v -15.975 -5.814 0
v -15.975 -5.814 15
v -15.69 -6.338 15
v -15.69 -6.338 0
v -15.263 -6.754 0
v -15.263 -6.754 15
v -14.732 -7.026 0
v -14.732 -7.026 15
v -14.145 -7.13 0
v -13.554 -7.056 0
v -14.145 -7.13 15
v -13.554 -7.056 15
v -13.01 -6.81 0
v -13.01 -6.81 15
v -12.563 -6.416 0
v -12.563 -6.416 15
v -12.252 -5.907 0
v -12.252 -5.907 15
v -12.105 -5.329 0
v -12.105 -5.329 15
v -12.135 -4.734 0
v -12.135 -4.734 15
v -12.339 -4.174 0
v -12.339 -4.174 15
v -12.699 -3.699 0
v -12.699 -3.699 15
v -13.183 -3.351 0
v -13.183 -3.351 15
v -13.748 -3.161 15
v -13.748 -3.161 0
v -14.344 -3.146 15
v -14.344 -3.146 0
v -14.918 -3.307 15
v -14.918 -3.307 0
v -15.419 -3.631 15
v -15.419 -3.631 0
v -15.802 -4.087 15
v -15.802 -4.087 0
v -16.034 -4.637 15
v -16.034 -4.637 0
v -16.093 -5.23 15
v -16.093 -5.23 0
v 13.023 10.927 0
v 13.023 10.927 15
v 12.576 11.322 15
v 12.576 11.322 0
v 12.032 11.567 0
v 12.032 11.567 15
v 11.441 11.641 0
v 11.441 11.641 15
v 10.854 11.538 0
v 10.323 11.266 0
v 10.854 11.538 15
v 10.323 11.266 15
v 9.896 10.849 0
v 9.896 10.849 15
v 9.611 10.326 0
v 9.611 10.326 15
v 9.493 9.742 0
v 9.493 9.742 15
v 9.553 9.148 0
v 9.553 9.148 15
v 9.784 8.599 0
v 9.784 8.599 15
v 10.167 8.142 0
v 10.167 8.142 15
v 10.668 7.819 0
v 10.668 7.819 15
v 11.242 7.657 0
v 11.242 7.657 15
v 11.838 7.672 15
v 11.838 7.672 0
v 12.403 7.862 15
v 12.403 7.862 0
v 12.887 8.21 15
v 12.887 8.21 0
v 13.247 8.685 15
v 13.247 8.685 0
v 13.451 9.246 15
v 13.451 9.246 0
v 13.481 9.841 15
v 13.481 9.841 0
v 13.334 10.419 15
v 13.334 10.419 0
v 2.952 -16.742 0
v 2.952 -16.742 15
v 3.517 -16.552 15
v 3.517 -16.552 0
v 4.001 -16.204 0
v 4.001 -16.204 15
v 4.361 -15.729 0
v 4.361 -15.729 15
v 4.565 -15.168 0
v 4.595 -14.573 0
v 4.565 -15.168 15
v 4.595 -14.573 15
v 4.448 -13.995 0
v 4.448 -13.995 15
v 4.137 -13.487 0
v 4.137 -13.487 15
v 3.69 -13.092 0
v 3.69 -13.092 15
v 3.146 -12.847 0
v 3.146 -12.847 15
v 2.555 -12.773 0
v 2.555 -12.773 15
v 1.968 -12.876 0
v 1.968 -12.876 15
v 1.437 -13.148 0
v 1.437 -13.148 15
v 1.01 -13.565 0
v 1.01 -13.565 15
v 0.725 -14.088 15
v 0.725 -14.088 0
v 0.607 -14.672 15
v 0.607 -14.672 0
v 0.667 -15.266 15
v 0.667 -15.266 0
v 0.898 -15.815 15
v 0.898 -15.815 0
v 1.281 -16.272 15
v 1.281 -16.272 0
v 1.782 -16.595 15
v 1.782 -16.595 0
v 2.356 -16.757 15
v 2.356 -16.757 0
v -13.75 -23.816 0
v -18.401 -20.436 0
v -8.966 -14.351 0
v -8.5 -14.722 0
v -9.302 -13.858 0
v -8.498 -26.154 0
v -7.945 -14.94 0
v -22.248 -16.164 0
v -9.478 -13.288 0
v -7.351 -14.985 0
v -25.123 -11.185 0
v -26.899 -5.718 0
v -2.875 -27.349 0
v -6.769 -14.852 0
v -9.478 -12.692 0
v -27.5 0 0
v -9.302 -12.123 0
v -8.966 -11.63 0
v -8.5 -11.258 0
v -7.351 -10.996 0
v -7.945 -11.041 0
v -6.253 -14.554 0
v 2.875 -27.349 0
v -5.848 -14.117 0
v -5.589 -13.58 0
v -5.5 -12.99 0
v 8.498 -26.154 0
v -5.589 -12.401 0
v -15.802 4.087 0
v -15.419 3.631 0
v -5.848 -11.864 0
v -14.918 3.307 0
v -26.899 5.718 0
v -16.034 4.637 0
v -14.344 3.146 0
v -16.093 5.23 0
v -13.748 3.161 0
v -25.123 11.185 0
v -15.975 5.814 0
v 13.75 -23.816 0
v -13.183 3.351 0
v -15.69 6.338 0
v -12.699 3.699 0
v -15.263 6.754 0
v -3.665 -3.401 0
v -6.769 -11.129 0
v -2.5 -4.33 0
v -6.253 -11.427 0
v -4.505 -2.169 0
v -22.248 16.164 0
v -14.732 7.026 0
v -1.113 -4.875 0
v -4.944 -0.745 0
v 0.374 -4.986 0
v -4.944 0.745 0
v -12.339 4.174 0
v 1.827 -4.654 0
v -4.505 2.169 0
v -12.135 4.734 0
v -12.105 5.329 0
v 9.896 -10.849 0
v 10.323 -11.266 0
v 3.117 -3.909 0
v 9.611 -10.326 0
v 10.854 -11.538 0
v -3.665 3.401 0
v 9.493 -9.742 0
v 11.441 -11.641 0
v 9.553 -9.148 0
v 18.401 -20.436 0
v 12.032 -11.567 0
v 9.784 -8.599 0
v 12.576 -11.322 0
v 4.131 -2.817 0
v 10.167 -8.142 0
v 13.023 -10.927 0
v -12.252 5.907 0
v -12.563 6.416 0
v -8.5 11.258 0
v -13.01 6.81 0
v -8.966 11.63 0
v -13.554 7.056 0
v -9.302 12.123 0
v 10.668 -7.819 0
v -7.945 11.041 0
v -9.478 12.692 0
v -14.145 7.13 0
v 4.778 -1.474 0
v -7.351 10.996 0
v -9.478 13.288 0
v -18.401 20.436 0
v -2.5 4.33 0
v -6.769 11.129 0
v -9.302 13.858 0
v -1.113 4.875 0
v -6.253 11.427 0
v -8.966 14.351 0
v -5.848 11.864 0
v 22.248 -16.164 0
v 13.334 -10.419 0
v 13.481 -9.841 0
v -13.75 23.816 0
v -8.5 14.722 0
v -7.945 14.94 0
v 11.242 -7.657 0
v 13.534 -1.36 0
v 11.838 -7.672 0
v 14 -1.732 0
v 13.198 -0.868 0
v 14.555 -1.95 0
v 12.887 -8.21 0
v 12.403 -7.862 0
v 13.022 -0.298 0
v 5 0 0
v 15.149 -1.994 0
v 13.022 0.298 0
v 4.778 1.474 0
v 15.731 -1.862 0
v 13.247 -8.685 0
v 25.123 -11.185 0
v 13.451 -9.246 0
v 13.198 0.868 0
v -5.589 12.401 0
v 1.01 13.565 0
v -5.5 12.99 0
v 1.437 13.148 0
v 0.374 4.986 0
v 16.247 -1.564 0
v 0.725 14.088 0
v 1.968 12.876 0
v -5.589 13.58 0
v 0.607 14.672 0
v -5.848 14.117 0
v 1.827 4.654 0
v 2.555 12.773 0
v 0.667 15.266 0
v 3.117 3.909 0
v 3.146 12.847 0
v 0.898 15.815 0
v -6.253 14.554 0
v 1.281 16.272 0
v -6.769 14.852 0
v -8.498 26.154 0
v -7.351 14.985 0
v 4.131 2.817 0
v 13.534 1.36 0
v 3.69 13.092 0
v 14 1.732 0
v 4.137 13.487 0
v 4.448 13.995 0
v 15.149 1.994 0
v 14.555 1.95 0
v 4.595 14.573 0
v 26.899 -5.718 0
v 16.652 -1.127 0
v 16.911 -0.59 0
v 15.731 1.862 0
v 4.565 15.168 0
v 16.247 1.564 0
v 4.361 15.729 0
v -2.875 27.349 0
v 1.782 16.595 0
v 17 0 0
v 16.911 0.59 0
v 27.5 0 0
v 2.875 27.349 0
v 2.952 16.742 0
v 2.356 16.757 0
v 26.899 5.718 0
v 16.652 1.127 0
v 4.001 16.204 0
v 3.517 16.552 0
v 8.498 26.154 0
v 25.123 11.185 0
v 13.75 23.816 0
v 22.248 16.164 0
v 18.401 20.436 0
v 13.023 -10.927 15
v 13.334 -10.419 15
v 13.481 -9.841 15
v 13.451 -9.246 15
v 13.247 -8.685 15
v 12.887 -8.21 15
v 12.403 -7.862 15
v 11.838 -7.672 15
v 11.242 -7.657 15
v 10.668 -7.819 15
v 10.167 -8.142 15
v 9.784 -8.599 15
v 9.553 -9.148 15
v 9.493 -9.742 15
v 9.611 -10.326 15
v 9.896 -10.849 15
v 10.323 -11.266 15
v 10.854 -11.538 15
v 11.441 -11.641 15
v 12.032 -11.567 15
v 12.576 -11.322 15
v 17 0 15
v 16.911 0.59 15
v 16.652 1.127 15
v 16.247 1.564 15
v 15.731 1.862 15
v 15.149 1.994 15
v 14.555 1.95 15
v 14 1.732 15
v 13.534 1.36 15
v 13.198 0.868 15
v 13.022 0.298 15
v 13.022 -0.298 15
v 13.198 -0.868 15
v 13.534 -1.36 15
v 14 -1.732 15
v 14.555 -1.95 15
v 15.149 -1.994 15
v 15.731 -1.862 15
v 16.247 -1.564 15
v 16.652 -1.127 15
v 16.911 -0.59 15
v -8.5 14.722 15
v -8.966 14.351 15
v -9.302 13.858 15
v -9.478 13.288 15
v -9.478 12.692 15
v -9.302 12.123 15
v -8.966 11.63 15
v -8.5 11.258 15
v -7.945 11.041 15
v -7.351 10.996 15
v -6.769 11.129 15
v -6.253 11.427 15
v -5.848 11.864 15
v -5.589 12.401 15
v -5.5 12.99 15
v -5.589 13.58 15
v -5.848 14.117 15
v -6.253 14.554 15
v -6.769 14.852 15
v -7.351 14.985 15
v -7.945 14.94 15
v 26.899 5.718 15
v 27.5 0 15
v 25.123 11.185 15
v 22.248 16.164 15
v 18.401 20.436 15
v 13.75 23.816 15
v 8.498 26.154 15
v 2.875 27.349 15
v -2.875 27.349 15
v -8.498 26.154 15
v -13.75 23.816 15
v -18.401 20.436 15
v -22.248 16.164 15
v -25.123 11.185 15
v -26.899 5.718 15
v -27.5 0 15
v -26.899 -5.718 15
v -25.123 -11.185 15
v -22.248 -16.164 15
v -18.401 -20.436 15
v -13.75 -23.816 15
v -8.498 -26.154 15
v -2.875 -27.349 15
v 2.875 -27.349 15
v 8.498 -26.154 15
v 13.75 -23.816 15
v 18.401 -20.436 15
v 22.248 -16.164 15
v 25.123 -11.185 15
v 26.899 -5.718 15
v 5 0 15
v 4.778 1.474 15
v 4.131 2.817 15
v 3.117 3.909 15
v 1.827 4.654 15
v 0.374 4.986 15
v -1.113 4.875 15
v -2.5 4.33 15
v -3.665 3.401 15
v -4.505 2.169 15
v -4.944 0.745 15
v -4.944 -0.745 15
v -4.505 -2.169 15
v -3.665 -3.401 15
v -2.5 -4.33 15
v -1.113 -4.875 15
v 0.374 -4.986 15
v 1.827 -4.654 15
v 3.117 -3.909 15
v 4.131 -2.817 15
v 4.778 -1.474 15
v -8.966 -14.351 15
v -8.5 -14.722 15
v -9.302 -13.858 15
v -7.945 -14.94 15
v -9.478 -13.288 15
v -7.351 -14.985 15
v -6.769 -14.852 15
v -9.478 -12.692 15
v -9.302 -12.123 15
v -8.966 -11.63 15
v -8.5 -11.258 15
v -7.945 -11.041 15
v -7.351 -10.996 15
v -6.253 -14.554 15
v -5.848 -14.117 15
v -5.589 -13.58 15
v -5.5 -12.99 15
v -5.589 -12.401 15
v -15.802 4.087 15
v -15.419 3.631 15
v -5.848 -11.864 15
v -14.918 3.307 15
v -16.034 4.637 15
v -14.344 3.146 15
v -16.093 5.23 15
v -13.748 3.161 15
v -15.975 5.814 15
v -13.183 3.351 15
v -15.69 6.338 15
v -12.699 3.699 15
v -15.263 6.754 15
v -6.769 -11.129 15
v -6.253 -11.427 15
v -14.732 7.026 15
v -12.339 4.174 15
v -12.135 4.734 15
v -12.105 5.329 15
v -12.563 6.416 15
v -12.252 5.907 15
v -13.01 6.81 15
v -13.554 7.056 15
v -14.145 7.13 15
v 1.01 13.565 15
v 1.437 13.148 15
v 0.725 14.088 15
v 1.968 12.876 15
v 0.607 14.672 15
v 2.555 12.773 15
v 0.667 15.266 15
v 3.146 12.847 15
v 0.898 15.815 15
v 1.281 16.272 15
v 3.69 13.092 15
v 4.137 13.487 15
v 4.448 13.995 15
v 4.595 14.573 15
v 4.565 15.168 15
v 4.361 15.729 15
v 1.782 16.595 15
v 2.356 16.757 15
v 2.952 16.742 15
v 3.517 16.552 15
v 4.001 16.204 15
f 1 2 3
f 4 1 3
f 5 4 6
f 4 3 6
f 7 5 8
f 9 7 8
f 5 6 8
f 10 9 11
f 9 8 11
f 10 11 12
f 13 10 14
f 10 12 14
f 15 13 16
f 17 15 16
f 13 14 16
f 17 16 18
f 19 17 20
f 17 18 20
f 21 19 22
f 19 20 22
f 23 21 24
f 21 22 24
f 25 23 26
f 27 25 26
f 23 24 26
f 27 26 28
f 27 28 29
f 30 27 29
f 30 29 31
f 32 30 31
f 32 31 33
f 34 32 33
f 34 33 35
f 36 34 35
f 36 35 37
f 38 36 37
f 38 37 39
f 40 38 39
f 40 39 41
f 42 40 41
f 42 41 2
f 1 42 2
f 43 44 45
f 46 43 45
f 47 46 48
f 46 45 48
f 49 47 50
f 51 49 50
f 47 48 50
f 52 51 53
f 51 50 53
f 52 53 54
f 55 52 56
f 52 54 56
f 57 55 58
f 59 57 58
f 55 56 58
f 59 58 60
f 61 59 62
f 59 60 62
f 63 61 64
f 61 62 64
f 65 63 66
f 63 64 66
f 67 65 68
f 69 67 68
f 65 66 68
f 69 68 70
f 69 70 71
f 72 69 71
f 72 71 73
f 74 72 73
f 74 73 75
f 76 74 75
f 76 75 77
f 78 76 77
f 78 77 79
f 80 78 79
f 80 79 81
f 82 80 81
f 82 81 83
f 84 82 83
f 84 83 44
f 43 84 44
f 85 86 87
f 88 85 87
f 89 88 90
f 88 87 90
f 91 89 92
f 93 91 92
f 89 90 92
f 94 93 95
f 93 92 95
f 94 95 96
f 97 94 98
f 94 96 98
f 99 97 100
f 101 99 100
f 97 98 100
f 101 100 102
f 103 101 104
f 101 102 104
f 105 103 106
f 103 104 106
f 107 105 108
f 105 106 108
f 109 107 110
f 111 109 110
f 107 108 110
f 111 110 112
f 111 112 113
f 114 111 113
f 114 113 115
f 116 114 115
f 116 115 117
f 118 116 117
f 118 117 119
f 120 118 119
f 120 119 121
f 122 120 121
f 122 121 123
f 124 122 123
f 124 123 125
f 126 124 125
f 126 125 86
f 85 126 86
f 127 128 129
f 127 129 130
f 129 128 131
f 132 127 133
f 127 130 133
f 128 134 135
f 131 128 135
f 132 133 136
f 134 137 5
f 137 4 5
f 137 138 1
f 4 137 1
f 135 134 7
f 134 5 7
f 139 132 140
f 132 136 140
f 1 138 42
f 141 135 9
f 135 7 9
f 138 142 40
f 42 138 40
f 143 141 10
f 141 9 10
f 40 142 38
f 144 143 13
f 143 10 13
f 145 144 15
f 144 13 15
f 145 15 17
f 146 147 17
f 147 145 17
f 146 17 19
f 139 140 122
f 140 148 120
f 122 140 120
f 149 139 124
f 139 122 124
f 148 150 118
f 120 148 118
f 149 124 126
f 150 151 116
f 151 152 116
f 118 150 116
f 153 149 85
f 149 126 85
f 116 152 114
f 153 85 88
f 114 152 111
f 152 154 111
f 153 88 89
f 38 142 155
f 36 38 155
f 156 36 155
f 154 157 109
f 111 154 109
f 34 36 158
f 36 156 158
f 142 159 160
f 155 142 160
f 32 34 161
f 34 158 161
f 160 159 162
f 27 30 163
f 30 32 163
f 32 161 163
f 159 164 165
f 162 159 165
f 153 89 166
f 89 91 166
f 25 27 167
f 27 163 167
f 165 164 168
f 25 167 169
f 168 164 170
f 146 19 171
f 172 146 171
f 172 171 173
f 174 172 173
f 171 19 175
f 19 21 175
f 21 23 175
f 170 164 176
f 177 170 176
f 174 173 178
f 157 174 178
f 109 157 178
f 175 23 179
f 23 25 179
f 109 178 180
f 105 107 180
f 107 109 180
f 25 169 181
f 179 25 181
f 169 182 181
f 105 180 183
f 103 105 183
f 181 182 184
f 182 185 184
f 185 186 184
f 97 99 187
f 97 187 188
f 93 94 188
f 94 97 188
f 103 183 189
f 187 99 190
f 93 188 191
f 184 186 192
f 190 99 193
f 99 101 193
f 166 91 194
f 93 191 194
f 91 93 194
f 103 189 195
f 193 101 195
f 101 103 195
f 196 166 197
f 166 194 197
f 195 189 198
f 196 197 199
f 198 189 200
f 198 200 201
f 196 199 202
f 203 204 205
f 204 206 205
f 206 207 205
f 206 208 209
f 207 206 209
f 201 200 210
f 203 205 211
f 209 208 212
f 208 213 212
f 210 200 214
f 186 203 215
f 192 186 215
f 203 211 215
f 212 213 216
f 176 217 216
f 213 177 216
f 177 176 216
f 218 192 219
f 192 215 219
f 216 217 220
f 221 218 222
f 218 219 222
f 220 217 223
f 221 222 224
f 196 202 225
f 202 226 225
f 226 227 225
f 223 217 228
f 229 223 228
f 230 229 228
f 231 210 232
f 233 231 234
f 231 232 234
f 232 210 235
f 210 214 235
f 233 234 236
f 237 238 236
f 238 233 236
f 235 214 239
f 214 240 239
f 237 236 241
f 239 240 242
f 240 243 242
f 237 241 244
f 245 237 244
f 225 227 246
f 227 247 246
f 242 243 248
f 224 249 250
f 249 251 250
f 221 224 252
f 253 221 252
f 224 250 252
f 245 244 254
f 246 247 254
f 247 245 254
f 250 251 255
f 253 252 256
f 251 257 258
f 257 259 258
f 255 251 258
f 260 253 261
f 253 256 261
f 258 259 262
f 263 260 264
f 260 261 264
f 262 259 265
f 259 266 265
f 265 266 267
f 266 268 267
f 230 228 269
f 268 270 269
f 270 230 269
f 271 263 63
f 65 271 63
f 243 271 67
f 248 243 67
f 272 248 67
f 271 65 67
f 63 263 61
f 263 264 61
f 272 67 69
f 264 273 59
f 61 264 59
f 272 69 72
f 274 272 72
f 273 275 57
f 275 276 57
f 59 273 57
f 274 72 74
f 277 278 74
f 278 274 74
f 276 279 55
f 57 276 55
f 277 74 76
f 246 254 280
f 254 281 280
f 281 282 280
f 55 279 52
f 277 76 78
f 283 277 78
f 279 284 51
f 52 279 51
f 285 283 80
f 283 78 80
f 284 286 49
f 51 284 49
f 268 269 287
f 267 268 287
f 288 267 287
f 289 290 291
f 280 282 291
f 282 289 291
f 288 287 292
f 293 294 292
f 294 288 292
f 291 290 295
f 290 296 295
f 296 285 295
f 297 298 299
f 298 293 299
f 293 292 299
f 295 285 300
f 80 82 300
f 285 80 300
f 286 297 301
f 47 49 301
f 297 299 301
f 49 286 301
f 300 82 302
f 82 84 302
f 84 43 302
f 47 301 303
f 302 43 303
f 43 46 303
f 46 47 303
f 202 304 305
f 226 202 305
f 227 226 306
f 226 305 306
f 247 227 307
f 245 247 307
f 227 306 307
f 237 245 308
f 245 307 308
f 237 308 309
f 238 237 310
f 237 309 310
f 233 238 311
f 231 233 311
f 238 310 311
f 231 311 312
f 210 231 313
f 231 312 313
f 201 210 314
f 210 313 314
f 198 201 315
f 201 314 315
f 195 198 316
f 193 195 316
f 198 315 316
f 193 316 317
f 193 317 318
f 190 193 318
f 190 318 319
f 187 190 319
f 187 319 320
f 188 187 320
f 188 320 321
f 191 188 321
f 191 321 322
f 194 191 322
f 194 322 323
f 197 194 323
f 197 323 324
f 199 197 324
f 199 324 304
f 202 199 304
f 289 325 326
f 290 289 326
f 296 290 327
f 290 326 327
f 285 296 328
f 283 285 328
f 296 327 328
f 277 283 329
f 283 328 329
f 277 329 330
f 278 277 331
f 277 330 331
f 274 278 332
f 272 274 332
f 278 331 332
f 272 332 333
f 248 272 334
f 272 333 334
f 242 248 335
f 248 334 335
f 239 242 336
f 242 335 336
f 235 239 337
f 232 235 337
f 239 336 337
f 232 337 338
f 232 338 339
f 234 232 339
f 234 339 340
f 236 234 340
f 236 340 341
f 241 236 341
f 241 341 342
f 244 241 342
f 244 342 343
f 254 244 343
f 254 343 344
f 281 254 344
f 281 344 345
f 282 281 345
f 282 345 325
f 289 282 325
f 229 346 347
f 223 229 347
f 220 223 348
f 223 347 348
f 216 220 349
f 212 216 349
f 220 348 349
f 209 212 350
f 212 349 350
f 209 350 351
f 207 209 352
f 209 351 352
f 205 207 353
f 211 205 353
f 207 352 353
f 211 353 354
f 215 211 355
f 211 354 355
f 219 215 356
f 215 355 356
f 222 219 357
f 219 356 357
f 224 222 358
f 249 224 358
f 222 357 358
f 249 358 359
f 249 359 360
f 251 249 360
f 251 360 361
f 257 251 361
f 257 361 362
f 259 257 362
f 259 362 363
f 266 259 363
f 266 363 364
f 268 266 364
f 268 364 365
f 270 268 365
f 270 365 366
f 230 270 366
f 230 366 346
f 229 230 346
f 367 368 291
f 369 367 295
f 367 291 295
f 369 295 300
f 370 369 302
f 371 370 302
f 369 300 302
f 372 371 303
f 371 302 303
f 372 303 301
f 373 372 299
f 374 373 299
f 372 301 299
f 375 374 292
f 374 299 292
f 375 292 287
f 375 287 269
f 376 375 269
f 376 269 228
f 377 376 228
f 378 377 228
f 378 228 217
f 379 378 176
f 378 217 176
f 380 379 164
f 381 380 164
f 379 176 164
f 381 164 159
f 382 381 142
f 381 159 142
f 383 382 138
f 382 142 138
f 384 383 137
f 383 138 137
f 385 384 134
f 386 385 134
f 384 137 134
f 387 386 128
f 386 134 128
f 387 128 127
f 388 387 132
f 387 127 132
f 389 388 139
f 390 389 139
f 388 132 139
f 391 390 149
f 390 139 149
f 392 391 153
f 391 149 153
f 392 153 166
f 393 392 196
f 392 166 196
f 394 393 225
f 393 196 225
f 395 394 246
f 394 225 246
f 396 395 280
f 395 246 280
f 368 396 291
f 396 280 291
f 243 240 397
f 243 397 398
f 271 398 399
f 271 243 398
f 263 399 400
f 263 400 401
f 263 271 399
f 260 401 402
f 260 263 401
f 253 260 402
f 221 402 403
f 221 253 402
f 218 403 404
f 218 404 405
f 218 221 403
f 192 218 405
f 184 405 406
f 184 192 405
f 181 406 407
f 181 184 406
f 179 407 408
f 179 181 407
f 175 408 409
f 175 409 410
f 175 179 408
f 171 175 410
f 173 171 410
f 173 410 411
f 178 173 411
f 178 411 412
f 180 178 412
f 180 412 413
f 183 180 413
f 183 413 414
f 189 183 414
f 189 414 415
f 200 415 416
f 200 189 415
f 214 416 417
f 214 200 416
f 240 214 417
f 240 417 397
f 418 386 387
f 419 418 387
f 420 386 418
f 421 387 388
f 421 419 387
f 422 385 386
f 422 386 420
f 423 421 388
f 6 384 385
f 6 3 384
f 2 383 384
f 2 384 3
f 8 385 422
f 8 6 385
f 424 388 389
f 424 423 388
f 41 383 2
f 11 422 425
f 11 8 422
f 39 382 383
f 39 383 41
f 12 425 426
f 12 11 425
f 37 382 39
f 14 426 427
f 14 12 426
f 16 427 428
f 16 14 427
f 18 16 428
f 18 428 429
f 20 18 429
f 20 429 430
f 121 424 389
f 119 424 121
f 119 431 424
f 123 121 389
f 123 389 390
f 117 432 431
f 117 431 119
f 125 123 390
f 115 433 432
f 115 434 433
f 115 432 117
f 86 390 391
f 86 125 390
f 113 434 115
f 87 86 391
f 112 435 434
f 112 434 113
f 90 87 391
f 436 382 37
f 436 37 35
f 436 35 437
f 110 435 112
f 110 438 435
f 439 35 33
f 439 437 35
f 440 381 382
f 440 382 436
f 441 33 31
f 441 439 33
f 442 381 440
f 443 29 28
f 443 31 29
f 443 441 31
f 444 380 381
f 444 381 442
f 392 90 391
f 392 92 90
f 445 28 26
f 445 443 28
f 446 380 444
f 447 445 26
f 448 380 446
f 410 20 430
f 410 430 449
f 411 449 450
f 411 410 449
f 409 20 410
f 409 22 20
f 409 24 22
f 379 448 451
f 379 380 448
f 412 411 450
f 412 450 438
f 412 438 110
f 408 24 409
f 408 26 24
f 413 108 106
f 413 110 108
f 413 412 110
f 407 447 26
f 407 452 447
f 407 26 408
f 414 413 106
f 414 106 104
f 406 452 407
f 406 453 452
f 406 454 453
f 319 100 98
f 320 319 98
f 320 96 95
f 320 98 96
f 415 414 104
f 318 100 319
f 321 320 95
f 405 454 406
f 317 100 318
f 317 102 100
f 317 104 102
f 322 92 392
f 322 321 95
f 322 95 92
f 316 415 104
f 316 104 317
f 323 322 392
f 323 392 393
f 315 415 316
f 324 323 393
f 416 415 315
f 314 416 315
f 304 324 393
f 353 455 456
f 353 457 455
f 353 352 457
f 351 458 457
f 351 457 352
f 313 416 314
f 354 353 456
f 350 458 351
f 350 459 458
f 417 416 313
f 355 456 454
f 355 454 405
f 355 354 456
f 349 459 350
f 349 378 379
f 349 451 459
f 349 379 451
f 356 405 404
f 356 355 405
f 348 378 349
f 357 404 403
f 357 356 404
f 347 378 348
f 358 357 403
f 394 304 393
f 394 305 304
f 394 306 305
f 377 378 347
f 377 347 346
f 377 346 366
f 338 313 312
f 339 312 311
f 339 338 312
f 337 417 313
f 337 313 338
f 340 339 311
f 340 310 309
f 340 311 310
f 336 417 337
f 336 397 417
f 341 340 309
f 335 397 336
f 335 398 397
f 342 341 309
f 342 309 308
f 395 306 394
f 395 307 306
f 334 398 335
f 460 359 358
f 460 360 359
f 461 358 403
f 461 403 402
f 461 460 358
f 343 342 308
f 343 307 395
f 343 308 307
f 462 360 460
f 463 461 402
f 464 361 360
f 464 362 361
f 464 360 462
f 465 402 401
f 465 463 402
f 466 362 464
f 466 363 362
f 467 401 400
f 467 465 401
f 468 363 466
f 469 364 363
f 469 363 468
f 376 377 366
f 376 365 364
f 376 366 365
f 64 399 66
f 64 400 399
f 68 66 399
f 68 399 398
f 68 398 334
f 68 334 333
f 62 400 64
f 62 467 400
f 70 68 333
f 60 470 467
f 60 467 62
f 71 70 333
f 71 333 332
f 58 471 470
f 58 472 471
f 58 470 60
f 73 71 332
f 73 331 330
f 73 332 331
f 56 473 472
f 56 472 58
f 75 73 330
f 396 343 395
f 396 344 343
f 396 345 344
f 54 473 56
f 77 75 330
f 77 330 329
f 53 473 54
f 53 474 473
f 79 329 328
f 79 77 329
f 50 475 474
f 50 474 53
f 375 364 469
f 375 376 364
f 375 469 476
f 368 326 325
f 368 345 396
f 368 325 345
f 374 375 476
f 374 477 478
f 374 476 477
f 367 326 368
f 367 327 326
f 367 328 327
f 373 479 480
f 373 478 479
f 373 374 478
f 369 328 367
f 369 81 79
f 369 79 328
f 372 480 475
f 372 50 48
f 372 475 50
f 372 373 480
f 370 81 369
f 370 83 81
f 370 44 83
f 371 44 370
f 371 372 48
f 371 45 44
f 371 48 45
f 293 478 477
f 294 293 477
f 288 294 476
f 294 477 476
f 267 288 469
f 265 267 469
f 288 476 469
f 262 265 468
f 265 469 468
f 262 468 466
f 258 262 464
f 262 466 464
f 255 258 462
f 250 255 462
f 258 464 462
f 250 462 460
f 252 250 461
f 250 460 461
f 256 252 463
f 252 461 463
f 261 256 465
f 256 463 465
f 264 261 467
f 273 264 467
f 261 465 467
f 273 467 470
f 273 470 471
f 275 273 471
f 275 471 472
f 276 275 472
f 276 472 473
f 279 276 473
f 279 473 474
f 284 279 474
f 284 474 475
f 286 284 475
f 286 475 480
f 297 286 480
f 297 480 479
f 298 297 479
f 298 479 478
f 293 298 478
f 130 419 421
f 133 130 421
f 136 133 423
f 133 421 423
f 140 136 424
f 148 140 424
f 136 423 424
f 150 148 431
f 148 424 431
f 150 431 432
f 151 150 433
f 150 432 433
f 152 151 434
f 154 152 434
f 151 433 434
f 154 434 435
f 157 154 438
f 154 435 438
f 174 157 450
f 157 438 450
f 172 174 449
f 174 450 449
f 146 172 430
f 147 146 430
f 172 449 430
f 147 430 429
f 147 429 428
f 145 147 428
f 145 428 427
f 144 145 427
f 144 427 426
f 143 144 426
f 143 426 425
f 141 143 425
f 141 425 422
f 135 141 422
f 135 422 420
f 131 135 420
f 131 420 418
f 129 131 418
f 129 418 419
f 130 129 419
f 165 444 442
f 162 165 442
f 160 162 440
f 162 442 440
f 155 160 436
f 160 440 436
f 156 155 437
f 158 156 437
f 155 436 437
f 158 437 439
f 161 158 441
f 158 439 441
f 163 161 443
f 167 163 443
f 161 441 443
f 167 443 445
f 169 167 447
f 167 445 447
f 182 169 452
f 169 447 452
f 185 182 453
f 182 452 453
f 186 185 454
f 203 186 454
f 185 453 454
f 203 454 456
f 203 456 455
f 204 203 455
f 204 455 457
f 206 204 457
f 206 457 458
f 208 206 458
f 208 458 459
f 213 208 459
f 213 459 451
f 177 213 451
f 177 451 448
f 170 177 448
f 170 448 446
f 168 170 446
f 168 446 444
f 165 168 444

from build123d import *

# Parameters (mm, degrees)
F0_R            = 27.5
F0_R_2          = 5
F1_DEPTH        = 15
F2_R            = 2
F3_DEPTH        = 15.001
F3_COPIES_COUNT = 9


# Not quite as in the source:
# - a pattern or mirror of a feature is missing from the dataset's text; its kind, count and spacing are read off the source's solid


with BuildPart() as f1:
    # F0 (on Top) → F1 (new body)
    with BuildSketch(Plane.XY):
        Circle(F0_R)
        Circle(F0_R_2, mode=Mode.SUBTRACT)
    extrude(amount=F1_DEPTH)

    # F2 (on face) → F3 (cut, through all)
    with BuildSketch(Plane.XY.offset(15)):
        with Locations((15, 0)):
            Circle(F2_R)
    f3 = extrude(amount=-F3_DEPTH, mode=Mode.SUBTRACT)

    # F3_copies: F3 ×9 about axis
    f3_copies_axis = Axis((0, 0, 0), (0, 0, 1))
    for i in range(1, F3_COPIES_COUNT):
        add(f3.rotate(f3_copies_axis, i * 360 / F3_COPIES_COUNT), mode=Mode.SUBTRACT)


solid = f1.part
